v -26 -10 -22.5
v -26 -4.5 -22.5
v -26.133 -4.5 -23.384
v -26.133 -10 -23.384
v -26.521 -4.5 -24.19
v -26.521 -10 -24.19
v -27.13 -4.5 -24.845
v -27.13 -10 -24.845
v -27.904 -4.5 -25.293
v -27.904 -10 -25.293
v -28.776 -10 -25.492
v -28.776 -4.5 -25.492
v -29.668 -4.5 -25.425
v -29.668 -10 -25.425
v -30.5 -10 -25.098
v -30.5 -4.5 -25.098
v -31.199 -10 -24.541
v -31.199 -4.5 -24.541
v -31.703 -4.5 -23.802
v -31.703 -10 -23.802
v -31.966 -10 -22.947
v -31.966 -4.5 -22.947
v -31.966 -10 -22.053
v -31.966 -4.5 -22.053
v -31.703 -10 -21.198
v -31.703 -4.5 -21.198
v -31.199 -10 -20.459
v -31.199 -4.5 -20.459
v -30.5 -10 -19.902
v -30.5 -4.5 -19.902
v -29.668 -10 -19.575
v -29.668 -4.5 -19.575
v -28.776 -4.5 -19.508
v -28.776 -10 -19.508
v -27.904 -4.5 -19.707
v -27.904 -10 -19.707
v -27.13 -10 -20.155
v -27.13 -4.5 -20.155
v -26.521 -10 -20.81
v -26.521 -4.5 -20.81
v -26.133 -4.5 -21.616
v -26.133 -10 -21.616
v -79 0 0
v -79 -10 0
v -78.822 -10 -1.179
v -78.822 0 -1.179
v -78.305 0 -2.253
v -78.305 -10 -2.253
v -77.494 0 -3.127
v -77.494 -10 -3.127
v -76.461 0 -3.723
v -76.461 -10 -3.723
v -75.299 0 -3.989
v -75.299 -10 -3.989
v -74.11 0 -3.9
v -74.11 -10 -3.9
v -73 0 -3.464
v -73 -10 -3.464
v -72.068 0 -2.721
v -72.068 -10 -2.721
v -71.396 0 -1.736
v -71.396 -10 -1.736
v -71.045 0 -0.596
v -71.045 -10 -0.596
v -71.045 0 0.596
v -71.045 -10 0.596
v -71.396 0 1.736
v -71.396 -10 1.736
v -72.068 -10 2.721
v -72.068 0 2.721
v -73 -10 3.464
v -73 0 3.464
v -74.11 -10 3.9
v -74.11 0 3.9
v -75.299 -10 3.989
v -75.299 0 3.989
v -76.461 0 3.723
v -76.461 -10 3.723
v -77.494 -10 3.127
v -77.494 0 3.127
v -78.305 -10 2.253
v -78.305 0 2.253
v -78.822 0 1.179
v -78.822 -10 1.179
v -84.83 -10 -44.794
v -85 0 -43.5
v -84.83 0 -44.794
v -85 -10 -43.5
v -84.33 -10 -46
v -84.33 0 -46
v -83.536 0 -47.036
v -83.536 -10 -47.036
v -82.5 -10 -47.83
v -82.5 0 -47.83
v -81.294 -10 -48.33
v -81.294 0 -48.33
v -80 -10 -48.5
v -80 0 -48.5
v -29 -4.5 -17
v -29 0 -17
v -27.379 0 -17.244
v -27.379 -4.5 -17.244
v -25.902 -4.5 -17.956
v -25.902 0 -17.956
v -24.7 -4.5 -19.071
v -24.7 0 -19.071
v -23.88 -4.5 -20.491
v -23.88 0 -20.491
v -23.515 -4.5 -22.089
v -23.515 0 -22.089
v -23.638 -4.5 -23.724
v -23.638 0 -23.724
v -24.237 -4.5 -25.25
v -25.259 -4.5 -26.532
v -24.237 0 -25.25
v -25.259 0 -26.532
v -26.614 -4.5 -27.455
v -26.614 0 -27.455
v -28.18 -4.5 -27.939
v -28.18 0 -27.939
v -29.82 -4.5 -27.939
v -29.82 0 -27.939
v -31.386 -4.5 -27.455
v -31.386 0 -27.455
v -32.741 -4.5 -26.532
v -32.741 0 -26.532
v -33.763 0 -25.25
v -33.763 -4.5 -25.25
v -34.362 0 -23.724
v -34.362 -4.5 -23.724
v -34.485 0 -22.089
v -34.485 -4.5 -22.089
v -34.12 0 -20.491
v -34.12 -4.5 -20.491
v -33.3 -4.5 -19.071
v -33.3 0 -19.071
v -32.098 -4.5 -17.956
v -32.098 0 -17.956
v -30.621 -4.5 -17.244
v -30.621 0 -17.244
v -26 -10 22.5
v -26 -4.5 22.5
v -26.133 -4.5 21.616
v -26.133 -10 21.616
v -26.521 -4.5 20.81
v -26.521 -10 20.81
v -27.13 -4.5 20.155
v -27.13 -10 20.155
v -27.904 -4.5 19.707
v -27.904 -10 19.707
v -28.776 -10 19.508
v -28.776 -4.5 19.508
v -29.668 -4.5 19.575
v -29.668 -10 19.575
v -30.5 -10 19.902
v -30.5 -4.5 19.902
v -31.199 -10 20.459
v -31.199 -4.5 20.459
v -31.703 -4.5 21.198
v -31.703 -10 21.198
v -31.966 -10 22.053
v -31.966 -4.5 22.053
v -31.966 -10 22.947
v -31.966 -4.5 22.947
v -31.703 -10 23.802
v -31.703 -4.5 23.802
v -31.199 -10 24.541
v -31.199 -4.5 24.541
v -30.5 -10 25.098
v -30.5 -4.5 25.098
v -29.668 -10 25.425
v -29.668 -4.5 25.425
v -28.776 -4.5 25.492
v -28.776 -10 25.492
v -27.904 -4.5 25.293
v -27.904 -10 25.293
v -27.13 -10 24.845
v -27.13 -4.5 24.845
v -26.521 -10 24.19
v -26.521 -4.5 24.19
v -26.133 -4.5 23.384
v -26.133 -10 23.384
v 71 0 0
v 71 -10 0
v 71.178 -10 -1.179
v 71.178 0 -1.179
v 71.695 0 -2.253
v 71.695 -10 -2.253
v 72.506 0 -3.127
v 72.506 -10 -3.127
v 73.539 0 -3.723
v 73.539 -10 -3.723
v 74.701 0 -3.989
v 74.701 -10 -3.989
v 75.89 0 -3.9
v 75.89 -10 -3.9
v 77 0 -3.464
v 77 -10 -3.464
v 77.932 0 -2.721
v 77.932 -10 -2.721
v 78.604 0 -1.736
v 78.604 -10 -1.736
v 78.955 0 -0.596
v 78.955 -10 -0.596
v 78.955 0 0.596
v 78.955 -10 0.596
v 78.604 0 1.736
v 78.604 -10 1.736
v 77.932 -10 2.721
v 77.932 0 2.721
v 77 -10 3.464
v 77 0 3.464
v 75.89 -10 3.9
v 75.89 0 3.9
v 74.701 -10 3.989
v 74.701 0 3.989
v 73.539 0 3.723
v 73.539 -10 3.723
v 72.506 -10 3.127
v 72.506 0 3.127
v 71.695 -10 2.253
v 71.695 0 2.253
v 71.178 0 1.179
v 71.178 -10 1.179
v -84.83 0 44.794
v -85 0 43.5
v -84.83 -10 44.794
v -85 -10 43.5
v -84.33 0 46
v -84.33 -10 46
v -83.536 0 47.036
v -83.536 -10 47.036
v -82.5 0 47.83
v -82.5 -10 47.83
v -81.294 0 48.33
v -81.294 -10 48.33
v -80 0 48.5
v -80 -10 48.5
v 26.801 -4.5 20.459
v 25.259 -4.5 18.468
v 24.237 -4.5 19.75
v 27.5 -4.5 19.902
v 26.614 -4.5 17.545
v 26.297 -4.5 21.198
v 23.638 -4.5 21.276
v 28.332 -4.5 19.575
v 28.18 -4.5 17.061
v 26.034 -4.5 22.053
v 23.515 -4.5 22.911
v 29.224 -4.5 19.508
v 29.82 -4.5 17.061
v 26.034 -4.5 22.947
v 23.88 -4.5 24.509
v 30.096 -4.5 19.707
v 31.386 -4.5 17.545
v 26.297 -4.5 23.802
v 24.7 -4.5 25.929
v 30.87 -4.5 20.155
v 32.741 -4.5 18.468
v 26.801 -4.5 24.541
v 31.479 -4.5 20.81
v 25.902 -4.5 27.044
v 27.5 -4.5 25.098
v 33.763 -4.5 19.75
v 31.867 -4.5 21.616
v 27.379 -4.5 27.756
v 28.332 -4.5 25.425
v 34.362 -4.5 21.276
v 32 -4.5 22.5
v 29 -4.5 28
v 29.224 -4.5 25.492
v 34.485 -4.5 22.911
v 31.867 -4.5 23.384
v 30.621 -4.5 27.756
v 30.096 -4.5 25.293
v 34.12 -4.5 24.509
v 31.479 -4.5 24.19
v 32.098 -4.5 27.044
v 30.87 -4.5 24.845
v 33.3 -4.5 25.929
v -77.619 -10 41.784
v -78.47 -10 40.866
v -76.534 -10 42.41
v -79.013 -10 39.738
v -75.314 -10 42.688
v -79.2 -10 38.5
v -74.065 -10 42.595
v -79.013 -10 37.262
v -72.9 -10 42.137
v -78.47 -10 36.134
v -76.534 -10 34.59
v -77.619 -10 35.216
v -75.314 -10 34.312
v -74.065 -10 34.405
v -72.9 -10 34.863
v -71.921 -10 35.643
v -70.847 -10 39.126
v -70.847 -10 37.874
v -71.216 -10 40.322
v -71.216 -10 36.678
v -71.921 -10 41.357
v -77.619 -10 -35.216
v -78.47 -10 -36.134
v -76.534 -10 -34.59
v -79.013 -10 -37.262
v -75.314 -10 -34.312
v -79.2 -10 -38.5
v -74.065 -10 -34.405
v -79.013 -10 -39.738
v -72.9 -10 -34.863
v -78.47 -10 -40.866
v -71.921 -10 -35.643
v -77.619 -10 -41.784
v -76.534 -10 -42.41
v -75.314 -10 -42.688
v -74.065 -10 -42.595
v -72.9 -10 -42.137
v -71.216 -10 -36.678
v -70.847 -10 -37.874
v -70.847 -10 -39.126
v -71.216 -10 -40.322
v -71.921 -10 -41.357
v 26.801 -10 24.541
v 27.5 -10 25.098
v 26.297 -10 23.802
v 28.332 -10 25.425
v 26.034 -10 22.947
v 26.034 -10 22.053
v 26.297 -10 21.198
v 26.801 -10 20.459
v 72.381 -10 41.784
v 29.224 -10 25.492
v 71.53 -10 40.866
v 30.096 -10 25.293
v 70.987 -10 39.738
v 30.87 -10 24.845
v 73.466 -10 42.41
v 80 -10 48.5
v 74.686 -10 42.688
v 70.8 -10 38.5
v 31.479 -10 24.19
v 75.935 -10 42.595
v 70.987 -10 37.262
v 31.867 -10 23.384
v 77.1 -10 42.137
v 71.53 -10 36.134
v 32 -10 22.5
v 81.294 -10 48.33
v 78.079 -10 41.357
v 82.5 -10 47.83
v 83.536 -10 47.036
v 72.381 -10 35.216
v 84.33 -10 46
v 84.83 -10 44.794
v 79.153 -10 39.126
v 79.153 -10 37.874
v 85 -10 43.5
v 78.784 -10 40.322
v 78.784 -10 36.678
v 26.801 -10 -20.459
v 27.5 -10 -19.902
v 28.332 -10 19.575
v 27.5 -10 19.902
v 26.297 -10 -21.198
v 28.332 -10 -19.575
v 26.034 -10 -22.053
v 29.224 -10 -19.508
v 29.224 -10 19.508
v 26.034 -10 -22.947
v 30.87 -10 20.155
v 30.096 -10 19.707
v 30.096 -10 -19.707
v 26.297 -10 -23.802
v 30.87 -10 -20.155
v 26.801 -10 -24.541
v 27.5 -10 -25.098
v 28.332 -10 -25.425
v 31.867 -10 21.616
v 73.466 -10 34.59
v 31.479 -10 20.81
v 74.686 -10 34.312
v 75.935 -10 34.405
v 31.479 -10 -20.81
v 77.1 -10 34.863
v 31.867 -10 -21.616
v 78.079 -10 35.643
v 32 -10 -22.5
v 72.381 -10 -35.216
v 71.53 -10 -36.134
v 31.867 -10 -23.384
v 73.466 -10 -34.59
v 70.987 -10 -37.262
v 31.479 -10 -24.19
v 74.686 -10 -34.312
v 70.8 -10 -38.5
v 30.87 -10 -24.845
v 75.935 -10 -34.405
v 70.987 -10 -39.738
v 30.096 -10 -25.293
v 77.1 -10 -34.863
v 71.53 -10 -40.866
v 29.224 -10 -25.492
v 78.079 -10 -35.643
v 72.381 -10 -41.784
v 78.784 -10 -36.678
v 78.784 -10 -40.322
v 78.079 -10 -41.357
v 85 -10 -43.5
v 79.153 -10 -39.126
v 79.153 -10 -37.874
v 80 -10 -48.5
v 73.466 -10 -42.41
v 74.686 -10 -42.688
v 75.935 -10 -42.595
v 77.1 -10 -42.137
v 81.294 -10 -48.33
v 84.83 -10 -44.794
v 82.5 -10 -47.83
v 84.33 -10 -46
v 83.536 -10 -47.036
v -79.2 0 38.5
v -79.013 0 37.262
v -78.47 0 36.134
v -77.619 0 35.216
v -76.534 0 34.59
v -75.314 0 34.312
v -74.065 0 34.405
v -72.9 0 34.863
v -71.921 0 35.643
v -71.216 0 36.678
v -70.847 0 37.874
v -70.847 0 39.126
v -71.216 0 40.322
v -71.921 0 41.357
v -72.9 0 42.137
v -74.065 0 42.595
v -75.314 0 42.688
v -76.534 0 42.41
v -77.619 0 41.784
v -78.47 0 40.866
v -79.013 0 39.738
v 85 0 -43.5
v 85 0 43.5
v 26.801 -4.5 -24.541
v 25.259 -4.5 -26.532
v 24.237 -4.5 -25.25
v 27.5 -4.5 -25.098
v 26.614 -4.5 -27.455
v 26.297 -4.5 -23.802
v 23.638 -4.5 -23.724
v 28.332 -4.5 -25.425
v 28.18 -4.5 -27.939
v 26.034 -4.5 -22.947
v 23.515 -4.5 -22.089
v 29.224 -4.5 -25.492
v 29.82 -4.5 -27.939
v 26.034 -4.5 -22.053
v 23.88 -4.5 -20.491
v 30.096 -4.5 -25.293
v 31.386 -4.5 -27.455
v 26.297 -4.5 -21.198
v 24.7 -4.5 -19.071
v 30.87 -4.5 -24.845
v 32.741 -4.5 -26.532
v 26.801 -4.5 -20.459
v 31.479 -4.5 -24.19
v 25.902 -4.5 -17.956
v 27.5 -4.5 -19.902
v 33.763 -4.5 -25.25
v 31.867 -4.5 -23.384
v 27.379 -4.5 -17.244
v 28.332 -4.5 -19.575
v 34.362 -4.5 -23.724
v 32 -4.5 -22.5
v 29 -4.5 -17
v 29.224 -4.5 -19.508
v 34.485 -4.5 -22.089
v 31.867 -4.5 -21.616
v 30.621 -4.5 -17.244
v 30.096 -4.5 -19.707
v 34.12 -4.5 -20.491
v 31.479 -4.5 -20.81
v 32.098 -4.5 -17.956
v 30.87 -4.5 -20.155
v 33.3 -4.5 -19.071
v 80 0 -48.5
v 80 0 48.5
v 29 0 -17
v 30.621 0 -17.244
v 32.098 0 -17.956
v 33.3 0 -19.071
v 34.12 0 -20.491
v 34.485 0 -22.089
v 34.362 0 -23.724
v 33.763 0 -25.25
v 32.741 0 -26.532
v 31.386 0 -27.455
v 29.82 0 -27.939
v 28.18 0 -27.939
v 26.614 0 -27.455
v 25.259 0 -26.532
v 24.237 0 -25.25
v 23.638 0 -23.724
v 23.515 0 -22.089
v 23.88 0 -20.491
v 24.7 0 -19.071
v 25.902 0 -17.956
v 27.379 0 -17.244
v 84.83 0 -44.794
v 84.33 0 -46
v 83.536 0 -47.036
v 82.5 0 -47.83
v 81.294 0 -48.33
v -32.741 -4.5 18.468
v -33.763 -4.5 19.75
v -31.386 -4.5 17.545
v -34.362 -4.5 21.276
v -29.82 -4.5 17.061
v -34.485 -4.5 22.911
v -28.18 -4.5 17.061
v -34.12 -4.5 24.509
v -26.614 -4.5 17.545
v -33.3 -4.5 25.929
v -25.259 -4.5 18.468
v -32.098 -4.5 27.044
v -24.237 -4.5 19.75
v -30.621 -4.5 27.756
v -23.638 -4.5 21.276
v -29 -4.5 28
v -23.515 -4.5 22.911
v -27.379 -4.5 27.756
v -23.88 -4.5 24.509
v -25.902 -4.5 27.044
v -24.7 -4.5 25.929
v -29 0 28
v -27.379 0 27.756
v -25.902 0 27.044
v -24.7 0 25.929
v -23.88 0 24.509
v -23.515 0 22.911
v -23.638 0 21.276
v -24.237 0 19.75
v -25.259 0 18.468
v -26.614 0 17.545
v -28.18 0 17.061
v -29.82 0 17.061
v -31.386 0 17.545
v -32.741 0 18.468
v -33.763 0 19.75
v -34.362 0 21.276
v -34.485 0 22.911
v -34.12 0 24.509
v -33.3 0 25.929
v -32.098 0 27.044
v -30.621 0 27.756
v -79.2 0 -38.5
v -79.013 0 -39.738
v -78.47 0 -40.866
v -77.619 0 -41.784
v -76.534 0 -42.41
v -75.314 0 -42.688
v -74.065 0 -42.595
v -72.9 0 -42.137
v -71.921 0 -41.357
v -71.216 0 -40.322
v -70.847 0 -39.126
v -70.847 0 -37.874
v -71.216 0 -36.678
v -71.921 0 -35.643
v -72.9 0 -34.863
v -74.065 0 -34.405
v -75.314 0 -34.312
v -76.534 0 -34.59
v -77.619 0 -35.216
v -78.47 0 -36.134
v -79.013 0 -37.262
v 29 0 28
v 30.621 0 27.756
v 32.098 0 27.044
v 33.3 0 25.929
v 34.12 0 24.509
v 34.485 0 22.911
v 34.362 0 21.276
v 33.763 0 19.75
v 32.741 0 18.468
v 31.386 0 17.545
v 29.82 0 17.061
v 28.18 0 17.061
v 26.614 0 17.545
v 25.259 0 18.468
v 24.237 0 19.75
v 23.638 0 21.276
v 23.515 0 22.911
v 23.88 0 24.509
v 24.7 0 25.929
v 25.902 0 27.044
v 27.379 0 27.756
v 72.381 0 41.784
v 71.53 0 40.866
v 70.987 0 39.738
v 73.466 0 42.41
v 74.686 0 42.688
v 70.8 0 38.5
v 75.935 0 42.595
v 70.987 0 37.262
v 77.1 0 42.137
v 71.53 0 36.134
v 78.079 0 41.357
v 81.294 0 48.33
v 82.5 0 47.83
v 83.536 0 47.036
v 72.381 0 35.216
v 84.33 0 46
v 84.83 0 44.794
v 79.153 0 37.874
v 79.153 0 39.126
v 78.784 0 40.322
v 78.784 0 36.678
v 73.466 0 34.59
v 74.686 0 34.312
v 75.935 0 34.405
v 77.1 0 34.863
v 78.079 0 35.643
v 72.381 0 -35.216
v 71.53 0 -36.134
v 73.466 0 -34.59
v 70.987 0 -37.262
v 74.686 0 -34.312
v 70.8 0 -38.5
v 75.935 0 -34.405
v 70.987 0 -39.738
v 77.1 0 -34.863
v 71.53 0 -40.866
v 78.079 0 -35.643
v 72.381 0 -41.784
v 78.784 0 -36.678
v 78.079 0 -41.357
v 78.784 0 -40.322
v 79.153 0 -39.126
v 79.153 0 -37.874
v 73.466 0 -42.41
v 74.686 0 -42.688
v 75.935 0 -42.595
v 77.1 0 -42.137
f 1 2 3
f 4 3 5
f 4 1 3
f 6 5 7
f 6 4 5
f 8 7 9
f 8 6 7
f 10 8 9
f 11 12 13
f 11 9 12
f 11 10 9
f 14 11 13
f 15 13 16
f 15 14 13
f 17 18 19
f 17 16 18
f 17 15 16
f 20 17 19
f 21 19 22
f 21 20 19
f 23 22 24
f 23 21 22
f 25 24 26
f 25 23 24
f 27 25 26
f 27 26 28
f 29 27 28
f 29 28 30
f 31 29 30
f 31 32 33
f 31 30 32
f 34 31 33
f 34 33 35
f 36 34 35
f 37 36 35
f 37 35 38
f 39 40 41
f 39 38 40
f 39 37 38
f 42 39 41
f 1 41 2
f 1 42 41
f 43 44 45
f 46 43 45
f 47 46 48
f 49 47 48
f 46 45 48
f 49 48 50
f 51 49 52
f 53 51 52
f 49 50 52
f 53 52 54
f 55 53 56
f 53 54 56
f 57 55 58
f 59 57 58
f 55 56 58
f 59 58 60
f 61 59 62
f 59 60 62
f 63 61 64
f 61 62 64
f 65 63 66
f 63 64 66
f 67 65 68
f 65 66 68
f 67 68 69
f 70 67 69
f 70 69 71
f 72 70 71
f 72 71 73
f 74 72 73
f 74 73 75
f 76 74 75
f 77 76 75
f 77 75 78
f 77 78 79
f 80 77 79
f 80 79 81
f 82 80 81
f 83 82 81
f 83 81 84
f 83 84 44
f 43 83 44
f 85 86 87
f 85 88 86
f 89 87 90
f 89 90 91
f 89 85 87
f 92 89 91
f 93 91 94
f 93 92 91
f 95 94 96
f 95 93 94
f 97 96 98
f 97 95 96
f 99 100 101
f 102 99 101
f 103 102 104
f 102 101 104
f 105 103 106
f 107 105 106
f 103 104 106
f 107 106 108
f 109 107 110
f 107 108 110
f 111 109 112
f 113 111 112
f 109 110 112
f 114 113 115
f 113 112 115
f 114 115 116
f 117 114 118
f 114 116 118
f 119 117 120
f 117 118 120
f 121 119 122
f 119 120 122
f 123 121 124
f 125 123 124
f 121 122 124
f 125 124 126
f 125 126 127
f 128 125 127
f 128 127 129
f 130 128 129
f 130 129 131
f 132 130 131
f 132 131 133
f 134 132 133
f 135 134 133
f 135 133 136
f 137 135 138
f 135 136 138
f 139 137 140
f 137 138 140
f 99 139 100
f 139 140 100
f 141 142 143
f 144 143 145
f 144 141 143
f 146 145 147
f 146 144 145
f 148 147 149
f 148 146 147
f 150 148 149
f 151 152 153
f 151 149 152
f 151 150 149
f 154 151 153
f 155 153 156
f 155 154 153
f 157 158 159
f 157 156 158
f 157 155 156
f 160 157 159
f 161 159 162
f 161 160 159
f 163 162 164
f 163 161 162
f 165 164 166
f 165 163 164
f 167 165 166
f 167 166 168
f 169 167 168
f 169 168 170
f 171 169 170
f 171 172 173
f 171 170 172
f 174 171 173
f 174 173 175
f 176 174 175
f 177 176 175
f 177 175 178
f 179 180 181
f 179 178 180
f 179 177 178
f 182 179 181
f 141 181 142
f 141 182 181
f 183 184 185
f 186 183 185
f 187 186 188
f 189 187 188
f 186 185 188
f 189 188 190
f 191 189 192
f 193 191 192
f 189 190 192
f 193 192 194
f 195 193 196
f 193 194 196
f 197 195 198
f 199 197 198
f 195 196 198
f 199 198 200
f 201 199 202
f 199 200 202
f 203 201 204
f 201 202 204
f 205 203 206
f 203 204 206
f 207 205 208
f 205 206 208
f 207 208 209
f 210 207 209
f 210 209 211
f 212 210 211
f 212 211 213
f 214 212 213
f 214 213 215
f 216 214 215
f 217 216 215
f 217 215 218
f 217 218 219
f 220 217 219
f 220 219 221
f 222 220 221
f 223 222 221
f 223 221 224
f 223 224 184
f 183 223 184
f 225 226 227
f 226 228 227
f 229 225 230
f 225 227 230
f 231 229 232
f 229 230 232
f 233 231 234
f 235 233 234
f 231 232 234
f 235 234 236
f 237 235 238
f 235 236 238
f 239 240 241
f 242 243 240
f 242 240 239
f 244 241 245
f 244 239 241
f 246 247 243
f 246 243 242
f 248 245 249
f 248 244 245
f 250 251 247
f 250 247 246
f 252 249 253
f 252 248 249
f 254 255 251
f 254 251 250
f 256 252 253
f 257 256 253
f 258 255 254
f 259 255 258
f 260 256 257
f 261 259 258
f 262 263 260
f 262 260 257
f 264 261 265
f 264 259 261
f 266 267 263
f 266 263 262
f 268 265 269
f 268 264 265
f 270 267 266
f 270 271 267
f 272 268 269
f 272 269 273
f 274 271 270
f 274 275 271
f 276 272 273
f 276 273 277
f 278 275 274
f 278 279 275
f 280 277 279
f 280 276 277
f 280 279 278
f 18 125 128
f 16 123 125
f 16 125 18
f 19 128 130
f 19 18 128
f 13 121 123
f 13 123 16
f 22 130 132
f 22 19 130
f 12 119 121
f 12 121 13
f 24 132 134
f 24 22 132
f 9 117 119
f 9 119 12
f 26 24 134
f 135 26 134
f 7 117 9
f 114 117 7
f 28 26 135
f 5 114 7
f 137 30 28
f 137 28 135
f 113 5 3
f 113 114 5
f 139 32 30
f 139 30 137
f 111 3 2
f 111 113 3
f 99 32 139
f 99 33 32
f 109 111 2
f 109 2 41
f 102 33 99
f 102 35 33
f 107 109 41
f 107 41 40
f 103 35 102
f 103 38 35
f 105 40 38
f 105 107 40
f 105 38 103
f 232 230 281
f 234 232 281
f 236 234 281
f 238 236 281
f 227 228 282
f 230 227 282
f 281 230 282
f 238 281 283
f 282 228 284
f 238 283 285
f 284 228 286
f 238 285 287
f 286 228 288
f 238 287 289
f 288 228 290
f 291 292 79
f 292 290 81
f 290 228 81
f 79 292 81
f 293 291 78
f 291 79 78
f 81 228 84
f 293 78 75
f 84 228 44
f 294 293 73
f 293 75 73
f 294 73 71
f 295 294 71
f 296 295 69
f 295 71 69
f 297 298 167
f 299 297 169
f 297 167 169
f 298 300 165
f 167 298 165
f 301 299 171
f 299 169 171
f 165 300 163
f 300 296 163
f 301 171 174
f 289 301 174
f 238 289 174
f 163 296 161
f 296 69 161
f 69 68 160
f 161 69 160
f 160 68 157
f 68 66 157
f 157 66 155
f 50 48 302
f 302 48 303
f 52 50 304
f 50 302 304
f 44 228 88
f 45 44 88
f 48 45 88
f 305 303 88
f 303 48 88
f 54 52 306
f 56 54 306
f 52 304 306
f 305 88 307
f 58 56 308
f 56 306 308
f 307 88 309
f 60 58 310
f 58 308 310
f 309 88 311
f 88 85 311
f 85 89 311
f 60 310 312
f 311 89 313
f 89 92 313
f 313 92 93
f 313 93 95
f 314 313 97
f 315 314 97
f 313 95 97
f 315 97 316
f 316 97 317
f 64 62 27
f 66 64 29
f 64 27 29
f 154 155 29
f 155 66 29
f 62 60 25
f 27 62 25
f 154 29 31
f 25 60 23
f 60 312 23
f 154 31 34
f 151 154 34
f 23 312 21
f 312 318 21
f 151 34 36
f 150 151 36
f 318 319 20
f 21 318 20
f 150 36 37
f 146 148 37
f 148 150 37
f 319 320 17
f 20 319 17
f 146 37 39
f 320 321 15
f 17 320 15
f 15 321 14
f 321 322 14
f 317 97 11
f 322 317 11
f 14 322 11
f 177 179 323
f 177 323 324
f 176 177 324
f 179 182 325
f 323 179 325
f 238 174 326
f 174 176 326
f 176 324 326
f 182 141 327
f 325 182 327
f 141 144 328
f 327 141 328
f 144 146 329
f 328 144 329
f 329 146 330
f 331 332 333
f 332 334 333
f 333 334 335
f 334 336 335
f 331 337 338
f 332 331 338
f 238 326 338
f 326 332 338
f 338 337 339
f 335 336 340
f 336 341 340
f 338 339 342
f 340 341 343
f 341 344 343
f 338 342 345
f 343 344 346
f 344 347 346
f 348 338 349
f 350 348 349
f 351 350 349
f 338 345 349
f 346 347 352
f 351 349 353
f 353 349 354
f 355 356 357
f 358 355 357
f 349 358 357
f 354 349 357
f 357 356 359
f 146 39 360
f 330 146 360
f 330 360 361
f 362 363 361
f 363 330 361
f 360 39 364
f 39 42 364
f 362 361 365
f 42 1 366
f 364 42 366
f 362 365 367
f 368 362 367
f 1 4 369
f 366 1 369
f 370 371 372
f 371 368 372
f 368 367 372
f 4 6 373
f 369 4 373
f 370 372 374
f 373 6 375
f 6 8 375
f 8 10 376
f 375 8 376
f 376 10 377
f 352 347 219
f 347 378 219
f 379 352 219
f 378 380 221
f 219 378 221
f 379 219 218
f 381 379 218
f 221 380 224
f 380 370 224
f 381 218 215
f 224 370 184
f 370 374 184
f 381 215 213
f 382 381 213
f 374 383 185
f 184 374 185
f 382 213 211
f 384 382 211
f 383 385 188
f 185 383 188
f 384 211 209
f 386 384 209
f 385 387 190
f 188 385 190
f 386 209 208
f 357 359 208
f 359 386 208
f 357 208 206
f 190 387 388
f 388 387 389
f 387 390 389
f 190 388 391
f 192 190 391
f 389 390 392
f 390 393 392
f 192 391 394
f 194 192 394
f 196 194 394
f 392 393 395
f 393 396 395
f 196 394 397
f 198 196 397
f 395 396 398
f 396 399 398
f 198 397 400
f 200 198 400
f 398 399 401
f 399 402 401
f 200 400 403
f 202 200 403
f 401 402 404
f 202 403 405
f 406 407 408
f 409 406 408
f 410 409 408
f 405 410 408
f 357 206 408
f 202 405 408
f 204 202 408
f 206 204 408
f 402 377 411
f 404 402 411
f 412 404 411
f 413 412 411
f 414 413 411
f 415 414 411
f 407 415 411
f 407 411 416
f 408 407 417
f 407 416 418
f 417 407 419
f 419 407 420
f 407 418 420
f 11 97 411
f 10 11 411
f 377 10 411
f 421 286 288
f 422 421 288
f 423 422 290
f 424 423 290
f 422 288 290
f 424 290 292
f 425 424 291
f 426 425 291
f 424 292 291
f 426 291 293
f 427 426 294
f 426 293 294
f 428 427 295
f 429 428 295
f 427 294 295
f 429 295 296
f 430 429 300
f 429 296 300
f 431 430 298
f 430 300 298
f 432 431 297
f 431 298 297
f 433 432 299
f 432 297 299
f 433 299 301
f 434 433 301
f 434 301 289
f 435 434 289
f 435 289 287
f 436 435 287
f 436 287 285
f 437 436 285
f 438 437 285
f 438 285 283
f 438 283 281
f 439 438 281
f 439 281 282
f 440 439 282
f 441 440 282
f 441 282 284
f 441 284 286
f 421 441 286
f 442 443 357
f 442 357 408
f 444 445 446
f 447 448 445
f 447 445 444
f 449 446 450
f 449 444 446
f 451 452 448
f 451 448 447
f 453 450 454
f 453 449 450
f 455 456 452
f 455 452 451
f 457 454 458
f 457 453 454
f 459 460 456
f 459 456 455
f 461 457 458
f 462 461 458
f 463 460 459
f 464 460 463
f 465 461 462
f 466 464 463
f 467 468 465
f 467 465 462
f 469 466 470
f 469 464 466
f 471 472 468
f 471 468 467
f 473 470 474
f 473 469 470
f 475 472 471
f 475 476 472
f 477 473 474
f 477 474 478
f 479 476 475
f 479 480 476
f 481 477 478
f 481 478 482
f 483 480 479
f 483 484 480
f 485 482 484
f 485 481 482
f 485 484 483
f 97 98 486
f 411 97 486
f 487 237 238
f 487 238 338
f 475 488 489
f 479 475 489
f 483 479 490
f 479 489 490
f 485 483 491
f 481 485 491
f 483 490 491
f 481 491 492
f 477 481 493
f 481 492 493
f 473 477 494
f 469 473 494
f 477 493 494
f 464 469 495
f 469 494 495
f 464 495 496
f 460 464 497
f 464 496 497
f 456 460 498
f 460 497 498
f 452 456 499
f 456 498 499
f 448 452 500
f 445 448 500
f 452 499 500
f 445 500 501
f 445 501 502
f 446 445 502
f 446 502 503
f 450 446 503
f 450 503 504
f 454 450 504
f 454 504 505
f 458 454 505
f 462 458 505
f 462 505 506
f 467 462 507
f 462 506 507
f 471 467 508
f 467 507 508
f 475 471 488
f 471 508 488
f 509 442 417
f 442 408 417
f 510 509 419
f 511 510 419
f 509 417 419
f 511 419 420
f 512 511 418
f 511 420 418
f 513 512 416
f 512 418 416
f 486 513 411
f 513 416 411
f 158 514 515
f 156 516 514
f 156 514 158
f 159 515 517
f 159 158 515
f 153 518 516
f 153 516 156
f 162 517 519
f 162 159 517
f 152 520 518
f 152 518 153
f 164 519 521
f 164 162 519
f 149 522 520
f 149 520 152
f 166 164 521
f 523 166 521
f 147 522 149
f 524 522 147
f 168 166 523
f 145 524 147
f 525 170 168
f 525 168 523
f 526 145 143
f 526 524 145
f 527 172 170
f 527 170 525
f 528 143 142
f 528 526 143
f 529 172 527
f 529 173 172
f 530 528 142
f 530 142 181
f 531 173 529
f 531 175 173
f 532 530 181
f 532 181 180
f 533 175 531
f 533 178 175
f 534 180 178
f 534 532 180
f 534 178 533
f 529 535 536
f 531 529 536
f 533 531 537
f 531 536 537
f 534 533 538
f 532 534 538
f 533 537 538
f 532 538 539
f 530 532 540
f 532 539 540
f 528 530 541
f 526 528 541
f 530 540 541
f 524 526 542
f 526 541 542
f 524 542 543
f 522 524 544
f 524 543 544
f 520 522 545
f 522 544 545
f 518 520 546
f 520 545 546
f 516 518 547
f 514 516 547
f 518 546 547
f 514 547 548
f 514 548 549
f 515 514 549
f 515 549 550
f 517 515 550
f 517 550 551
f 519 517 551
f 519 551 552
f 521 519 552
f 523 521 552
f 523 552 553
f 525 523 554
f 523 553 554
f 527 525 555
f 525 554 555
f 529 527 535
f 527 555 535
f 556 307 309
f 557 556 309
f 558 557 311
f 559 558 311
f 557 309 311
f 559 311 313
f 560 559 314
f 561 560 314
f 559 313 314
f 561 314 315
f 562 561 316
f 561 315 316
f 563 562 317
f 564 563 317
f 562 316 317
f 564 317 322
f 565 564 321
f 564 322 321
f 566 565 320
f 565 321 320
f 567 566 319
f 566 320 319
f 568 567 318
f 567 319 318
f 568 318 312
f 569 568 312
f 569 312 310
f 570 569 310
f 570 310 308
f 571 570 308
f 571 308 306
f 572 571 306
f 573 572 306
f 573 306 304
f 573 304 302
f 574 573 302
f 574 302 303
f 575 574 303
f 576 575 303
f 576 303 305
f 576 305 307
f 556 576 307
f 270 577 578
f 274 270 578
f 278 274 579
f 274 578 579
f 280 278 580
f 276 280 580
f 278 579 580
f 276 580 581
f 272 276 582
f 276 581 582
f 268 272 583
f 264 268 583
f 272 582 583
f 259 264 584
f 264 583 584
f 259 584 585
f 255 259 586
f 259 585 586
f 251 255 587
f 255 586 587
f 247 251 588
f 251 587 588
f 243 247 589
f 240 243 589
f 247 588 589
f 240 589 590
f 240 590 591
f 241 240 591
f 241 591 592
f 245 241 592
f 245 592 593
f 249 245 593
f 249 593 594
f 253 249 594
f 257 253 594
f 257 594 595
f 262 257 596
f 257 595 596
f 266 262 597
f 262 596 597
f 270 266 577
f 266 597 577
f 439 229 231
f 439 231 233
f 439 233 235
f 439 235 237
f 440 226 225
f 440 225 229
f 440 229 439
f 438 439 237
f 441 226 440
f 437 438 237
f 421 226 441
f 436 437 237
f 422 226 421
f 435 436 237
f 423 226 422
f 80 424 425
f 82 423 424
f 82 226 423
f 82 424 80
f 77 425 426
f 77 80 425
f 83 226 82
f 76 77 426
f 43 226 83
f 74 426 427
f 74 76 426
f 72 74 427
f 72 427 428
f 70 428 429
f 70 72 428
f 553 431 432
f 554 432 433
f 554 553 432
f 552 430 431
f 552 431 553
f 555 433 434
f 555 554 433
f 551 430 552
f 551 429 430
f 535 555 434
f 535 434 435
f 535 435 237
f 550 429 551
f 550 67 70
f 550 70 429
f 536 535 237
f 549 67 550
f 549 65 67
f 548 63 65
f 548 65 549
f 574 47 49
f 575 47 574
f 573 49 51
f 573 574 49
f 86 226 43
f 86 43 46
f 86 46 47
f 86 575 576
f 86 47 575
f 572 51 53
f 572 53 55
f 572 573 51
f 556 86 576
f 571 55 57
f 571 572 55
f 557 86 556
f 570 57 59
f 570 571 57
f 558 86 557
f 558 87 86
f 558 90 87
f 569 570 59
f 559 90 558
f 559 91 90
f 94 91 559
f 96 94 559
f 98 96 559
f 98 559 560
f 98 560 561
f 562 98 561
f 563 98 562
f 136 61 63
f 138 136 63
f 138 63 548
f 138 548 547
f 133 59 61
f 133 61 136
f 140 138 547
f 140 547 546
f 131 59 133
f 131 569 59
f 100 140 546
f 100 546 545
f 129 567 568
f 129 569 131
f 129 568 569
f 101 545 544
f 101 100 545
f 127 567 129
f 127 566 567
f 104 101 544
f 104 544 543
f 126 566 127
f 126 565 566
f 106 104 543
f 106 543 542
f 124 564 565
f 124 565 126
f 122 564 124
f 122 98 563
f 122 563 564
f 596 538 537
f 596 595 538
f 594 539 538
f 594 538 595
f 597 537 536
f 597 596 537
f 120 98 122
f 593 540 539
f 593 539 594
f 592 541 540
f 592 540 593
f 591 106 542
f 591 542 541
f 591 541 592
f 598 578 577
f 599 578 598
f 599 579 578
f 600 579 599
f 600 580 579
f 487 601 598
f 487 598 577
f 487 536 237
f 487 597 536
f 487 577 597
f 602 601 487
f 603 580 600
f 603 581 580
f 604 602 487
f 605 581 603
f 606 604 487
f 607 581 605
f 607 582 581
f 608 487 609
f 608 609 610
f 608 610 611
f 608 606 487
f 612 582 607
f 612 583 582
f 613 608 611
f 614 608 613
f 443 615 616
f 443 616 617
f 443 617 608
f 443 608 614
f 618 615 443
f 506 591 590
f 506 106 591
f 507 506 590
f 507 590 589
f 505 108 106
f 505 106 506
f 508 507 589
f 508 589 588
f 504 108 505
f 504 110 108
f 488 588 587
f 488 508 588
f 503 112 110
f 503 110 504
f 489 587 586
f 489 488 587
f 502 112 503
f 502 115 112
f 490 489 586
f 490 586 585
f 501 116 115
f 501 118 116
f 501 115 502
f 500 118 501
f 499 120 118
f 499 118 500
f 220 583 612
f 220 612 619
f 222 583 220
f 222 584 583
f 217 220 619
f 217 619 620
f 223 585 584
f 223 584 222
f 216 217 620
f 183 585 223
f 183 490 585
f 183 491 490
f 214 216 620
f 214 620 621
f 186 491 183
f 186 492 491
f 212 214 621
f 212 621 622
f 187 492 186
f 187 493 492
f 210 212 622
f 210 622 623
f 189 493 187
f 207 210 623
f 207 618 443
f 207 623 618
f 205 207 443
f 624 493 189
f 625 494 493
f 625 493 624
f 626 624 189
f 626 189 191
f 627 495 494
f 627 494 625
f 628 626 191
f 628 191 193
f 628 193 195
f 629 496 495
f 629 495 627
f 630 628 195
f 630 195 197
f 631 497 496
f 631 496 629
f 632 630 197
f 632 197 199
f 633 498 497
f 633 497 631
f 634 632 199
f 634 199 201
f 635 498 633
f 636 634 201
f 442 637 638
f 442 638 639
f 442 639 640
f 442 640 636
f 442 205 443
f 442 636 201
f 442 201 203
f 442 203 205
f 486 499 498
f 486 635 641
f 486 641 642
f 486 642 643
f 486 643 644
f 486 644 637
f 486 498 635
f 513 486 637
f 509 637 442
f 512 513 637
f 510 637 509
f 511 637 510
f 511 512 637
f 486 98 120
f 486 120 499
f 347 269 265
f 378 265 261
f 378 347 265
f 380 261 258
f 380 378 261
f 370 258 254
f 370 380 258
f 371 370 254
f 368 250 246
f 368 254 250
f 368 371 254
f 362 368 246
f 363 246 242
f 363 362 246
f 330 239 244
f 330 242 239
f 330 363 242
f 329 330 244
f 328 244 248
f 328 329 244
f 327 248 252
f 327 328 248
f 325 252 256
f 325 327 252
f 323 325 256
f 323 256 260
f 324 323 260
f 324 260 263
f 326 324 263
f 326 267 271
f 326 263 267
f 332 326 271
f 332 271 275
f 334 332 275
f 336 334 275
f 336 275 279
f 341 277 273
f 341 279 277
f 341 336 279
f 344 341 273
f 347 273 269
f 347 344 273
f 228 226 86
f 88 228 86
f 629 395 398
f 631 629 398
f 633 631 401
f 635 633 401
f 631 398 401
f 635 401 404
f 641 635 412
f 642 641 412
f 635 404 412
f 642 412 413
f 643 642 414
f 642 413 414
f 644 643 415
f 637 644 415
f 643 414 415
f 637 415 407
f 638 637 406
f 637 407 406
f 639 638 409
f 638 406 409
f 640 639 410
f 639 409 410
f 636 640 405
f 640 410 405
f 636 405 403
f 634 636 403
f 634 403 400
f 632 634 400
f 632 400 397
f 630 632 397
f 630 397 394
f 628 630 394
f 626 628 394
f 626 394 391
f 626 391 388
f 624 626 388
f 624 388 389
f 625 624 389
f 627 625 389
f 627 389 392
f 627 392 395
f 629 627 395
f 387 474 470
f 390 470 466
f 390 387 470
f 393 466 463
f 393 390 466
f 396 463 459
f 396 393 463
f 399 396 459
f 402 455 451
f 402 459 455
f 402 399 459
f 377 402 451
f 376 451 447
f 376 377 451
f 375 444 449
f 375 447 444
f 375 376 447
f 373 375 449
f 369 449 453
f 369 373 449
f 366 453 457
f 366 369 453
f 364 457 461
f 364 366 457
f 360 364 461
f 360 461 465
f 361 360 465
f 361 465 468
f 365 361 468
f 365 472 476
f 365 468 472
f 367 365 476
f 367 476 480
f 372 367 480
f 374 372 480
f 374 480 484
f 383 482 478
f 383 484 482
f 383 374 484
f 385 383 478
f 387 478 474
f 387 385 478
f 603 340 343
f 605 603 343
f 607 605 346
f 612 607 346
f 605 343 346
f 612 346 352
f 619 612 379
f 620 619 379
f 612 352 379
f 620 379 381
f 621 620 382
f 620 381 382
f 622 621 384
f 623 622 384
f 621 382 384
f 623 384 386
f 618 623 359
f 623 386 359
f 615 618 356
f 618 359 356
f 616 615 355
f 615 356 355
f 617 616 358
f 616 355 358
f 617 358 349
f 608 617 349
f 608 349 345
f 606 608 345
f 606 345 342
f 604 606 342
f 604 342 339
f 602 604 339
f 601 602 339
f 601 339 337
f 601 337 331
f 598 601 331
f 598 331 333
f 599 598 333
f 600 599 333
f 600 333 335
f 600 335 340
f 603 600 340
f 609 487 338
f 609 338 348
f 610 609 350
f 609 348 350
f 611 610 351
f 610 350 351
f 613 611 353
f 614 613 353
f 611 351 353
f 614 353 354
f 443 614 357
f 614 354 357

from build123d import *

# Parameters (mm, degrees)
SKETCH1_W                          = 170
SKETCH1_H                          = 97
BOSS_EXTRUDE1_DEPTH                = 10
FILLET1_R                          = 5
F_11_0_START                       = -10
F_11_0_11_DIAMETER_HOLE1_OUTLINE_R = 3
F_11_0_11_DIAMETER_HOLE1_DEPTH     = 10
SKETCH7_R                          = 5.5
CUT_EXTRUDE1_DEPTH                 = 4.5
M8_CLEARANCE_HOLE1_D               = 8.4
F_8_0MM_DOWEL_HOLE1_D              = 8


# Read off the part's stored shape, not the designer's step: Ø11.0 (11) Diameter Hole1
with BuildPart() as part:
    # Sketch1 → Boss-Extrude1 (new body)
    with BuildSketch(Plane(origin=(0, 0, 0), x_dir=(1, 0, 0), z_dir=(0, 1, 0))):
        Rectangle(SKETCH1_W, SKETCH1_H)
    extrude(amount=-BOSS_EXTRUDE1_DEPTH)

    # Fillet1
    fillet1_edges = [part.edges().sort_by_distance(p)[0] for p in [
        (85, -5, 48.5),
        (-85, -5, 48.5),
        (-85, -5, -48.5),
        (85, -5, -48.5),
    ]]
    fillet(fillet1_edges, radius=FILLET1_R)

    # Ø11.0 (11) Diameter Hole1 outline → Ø11.0 (11) Diameter Hole1 (cut)
    with BuildSketch(Plane(origin=(0, 0, 0), x_dir=(1, 0, 0), z_dir=(0, 1, 0)).offset(F_11_0_START)):
        with Locations((29, -22.5)):
            Circle(F_11_0_11_DIAMETER_HOLE1_OUTLINE_R)
        with Locations((-29, 22.5)):
            Circle(F_11_0_11_DIAMETER_HOLE1_OUTLINE_R)
        with Locations((-29, -22.5)):
            Circle(F_11_0_11_DIAMETER_HOLE1_OUTLINE_R)
        with Locations((29, 22.5)):
            Circle(F_11_0_11_DIAMETER_HOLE1_OUTLINE_R)
    extrude(amount=F_11_0_11_DIAMETER_HOLE1_DEPTH, mode=Mode.SUBTRACT)

    # Sketch7 → Cut-Extrude1 (cut)
    with BuildSketch(Plane(origin=(0, 0, 0), x_dir=(1, 0, 0), z_dir=(0, 1, 0))):
        with Locations(Location((-29, 22.5, 0), (0, 0, 270))):
            Circle(SKETCH7_R)
        with Locations(Location((29, 22.5, 0), (0, 0, 270))):
            Circle(SKETCH7_R)
        with Locations(Location((29, -22.5, 0), (0, 0, 270))):
            Circle(SKETCH7_R)
        with Locations(Location((-29, -22.5, 0), (0, 0, 270))):
            Circle(SKETCH7_R)
    extrude(amount=-CUT_EXTRUDE1_DEPTH, mode=Mode.SUBTRACT)

    # M8 Clearance Hole1 (through all)
    with Locations(Plane(origin=(0, 0, 0), x_dir=(1, 0, 0), z_dir=(0, 1, 0))):
        with Locations((-75, -38.5), (-75, 38.5), (75, -38.5), (75, 38.5)):
            Hole(M8_CLEARANCE_HOLE1_D / 2)

    # Ø8.0mm Dowel Hole1 (through all)
    with Locations(Plane(origin=(0, 0, 0), x_dir=(1, 0, 0), z_dir=(0, 1, 0))):
        with Locations((-75, 0), (75, 0)):
            Hole(F_8_0MM_DOWEL_HOLE1_D / 2)


solid = part.part
